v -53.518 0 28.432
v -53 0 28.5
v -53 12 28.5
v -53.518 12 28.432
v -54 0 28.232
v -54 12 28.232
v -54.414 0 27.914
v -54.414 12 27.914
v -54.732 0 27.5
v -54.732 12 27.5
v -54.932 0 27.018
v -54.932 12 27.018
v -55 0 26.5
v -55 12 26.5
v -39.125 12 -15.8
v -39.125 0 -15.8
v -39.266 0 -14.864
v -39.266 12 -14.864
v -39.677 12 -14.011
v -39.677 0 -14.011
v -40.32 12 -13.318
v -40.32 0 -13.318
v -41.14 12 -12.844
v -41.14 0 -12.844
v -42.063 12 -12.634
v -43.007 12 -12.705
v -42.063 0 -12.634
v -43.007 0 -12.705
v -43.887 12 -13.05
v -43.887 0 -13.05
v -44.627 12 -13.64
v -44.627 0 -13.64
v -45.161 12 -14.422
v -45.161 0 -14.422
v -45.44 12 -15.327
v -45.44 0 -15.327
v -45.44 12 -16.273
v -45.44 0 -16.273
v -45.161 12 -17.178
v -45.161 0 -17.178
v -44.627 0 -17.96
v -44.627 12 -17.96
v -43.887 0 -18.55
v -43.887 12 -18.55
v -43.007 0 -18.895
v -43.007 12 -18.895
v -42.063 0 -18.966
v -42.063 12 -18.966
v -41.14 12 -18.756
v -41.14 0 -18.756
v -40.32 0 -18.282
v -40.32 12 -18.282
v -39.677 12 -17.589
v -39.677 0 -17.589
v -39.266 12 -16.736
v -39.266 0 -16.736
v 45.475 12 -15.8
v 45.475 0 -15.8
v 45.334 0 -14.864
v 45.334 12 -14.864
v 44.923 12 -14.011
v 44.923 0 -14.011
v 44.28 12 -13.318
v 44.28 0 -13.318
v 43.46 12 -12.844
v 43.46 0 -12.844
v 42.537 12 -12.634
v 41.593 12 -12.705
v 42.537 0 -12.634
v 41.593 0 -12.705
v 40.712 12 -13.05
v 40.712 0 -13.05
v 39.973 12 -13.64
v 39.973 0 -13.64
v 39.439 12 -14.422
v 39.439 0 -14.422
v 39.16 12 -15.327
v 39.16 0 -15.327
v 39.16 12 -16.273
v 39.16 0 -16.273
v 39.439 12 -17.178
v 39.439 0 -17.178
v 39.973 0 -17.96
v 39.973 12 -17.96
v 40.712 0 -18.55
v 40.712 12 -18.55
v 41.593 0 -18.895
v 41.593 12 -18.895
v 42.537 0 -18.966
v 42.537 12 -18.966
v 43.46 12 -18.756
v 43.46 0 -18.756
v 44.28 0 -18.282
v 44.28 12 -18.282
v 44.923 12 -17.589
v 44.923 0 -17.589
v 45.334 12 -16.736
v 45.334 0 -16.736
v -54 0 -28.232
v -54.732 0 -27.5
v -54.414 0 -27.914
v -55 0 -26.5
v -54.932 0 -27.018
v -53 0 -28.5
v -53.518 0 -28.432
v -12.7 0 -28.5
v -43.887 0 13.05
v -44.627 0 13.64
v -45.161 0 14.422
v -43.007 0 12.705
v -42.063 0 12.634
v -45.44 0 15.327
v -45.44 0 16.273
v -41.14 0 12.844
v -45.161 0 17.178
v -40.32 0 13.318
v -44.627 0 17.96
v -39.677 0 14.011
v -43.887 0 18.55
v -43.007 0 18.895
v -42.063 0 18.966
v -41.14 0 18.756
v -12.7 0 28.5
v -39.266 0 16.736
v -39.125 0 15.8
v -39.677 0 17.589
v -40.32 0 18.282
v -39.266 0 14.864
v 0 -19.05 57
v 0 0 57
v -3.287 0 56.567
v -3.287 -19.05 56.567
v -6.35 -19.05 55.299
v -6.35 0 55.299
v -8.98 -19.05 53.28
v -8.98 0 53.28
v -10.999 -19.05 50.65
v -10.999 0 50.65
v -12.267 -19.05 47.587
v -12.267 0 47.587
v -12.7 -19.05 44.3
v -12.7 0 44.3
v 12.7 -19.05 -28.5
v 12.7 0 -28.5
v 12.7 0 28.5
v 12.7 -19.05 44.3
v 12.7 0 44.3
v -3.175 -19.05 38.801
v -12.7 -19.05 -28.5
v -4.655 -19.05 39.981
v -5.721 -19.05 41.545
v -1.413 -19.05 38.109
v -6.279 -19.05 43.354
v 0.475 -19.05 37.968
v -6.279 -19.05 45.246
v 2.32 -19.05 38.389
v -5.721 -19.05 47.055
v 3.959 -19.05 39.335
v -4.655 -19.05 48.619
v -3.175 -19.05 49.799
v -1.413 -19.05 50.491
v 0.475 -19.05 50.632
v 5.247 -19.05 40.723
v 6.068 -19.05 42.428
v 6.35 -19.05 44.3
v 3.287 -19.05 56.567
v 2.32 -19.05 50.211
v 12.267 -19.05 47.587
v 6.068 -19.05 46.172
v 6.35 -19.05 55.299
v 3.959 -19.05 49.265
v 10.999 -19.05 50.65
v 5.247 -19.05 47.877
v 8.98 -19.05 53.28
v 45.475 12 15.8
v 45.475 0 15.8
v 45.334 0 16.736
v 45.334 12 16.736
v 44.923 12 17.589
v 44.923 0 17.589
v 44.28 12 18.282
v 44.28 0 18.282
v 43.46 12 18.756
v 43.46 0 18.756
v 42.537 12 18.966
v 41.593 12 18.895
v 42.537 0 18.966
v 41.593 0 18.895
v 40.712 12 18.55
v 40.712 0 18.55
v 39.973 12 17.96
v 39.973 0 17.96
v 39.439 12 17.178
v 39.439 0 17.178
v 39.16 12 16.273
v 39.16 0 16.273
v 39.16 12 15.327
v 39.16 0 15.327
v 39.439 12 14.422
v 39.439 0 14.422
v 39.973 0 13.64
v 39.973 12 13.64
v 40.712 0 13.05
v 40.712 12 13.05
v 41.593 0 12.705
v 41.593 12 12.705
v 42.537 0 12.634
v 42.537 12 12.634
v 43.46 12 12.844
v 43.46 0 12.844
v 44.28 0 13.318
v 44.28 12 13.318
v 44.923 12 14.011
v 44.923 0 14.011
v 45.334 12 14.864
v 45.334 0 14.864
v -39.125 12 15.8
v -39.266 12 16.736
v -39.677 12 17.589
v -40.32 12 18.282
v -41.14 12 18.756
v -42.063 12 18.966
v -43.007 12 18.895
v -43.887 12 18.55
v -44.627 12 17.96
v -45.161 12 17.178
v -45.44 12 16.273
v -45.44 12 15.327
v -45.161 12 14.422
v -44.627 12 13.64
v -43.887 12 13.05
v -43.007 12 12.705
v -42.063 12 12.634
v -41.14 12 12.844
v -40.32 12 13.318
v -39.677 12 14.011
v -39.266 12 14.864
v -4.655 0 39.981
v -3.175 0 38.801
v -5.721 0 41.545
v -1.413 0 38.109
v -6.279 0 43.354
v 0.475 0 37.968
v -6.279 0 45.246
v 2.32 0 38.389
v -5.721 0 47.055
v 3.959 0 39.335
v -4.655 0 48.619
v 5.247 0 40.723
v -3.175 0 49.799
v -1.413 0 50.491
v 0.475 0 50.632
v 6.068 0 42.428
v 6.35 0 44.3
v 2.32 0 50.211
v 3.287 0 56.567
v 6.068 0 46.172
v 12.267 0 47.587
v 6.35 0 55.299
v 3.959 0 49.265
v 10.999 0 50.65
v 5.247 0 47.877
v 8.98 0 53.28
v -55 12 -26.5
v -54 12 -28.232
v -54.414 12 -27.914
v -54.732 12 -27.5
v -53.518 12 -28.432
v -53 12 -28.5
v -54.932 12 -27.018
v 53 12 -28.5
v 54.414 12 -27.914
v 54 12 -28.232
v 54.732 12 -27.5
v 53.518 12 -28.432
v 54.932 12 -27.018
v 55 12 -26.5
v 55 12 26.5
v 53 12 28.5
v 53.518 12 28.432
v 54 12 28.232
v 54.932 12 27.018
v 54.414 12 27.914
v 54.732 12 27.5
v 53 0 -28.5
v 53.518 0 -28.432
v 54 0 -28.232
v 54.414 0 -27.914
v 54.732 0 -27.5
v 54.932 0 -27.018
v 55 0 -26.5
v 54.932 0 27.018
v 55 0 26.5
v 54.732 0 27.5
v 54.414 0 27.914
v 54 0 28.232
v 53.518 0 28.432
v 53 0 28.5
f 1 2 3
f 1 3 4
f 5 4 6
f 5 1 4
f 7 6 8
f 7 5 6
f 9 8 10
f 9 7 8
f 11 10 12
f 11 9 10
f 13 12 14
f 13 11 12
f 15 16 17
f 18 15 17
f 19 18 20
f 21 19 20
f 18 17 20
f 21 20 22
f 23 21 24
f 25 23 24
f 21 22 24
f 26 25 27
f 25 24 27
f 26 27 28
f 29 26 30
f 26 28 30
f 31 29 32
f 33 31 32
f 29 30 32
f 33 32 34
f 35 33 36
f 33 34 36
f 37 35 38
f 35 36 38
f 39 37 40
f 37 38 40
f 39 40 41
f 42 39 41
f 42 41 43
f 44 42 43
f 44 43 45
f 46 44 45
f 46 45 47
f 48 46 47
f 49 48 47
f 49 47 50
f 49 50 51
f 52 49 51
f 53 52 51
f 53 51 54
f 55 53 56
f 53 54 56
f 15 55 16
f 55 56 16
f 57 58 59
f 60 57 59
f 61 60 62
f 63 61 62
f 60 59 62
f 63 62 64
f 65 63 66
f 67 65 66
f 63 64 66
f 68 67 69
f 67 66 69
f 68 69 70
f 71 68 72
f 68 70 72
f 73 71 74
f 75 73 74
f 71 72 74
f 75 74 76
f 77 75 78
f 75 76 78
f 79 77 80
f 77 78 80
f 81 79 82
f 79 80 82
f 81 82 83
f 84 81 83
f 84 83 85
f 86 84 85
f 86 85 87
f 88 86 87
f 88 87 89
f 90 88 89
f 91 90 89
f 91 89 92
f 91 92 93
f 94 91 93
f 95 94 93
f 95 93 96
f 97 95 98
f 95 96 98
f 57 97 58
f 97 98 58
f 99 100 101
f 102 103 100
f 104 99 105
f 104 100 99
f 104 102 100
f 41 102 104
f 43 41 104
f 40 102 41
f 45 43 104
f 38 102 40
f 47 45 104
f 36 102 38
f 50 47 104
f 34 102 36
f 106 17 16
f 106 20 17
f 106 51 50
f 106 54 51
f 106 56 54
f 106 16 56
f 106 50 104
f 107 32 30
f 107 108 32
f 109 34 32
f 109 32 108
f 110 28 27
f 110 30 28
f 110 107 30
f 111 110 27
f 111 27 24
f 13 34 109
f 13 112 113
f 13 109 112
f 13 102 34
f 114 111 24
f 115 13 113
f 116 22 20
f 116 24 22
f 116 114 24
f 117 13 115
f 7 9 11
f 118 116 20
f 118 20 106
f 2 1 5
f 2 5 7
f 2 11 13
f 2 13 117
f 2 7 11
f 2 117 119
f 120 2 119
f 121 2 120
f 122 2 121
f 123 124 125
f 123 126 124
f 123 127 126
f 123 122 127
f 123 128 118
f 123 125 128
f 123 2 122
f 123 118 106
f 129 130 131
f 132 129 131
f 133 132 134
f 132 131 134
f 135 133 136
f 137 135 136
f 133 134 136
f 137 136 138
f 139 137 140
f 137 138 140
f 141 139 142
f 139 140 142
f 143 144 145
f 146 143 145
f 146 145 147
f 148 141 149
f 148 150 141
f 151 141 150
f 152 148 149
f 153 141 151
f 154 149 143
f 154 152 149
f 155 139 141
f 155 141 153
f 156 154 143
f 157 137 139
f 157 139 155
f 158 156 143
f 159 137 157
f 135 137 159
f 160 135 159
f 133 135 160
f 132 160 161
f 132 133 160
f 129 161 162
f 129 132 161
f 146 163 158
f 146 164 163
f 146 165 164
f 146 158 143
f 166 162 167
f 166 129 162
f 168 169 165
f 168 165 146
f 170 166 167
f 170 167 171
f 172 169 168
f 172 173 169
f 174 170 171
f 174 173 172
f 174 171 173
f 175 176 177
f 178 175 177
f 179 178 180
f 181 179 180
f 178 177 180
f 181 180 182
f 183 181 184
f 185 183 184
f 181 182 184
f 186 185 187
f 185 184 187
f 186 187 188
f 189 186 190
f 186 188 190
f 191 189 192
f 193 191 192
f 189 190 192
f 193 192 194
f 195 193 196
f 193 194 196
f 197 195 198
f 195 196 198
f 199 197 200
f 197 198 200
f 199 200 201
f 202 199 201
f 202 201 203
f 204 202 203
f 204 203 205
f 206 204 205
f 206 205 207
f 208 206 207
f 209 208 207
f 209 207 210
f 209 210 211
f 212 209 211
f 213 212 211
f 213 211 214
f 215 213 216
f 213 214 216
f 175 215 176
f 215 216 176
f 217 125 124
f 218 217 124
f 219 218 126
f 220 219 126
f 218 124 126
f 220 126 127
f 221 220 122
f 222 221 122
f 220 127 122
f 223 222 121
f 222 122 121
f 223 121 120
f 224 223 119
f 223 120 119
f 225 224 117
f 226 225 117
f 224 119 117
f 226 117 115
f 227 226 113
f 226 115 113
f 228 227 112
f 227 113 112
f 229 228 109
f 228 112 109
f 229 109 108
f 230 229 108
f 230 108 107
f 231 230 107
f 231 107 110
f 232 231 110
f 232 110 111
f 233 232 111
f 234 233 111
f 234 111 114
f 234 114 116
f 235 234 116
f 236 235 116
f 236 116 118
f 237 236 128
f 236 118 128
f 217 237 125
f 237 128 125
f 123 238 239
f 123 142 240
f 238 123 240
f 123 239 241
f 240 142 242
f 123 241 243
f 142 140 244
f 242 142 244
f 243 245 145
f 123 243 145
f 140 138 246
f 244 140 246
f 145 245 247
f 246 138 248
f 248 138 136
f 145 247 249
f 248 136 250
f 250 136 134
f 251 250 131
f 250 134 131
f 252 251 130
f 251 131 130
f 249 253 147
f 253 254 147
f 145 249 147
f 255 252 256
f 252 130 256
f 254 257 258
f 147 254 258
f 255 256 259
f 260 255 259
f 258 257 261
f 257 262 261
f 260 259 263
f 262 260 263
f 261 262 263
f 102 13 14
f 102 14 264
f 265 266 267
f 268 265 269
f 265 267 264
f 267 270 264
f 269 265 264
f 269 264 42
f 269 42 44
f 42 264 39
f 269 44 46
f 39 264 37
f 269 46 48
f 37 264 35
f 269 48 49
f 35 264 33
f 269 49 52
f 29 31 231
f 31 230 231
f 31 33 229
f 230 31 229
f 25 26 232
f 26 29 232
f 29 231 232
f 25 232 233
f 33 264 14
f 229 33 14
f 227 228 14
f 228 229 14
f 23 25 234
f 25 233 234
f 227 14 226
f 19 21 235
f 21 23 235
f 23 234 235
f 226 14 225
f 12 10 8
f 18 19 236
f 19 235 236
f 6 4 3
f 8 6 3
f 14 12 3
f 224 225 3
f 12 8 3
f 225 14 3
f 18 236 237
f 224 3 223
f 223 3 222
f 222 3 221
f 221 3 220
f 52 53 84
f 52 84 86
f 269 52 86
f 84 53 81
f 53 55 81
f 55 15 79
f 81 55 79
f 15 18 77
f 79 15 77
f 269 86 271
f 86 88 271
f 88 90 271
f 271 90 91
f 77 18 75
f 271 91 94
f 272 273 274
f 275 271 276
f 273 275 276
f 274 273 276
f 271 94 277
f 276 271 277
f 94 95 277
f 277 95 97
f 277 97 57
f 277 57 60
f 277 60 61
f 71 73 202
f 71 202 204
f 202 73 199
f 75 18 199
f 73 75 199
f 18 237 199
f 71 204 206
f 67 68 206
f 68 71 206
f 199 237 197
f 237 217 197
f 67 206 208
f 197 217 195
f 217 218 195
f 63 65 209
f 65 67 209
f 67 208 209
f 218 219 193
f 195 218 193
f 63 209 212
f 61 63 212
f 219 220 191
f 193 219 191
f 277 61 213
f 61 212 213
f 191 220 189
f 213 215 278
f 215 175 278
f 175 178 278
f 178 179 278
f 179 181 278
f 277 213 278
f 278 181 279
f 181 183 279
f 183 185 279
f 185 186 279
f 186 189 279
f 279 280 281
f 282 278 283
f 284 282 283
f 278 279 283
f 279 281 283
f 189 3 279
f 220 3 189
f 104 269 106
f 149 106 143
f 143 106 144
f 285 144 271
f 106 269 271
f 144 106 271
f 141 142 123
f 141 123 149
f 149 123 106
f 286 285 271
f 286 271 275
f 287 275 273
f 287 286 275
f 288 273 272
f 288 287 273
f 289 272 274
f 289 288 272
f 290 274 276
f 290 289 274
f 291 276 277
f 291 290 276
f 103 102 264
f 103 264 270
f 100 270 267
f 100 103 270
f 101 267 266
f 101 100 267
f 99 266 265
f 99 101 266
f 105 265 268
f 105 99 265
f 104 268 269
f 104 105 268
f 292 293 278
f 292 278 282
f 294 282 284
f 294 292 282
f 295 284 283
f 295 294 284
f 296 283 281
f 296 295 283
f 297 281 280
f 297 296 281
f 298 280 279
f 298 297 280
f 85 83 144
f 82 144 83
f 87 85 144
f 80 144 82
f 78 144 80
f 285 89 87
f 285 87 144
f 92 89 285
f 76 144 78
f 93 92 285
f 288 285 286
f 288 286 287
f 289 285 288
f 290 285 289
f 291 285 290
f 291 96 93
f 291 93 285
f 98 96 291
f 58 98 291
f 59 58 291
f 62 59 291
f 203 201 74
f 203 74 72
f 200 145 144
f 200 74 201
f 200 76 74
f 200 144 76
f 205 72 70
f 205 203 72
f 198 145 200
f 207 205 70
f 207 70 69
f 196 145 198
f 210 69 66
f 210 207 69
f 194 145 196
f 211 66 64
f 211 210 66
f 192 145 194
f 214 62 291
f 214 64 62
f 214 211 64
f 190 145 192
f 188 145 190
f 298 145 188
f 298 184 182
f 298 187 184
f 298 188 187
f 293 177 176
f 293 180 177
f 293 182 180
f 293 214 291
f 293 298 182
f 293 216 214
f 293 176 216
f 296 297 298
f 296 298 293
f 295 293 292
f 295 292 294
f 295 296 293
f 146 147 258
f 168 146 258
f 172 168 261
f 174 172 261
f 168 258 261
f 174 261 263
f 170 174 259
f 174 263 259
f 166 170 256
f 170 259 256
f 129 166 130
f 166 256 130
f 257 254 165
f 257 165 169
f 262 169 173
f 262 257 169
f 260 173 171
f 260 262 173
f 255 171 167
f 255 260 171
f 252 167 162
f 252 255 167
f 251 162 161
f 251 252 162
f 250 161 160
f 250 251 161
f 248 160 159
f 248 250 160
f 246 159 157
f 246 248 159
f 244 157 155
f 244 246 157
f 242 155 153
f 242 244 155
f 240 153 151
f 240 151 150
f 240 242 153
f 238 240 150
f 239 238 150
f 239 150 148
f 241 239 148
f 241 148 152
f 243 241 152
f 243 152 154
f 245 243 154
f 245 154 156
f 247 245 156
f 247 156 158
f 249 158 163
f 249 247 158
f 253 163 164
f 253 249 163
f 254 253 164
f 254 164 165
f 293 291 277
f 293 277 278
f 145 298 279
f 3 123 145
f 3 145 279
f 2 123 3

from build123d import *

# Parameters (mm, degrees)
F0_W     = 25.4
F0_H     = 57
F0_R     = 3.175
F1_DEPTH = 12
F0_R_2   = 6.35
F2_DEPTH = 19.05


with BuildPart() as f1:
    # F0 (on Front) → F1 (new body)
    with BuildSketch(Plane.XZ):
        Rectangle(F0_W, F0_H)
        with BuildLine():
            Line((-12.7, 28.5), (-53, 28.5))
            ThreePointArc((-53, 28.5), (-54.4142135624, 27.9142135624), (-55, 26.5))
            Line((-55, 26.5), (-55, -26.5))
            ThreePointArc((-55, -26.5), (-54.4142135624, -27.9142135624), (-53, -28.5))
            Line((-53, -28.5), (-12.7, -28.5))
            Line((-12.7, -28.5), (-12.7, 28.5))
        make_face()
        with Locations((-42.3, -15.8)):
            Circle(F0_R, mode=Mode.SUBTRACT)
        with Locations((-42.3, 15.8)):
            Circle(F0_R, mode=Mode.SUBTRACT)
        with BuildLine():
            Line((53, 28.5), (12.7, 28.5))
            Line((12.7, 28.5), (12.7, -28.5))
            Line((12.7, -28.5), (53, -28.5))
            ThreePointArc((53, -28.5), (54.4142135624, -27.9142135624), (55, -26.5))
            Line((55, -26.5), (55, 26.5))
            ThreePointArc((55, 26.5), (54.4142135624, 27.9142135624), (53, 28.5))
        make_face()
        with Locations((42.3, -15.8)):
            Circle(F0_R, mode=Mode.SUBTRACT)
        with Locations((42.3, 15.8)):
            Circle(F0_R, mode=Mode.SUBTRACT)
    extrude(amount=-F1_DEPTH)

    # F0 (on Front) → F2 (join)
    with BuildSketch(Plane.XZ):
        Rectangle(F0_W, F0_H)
        with BuildLine():
            Line((-12.7, 44.3), (-12.7, 28.5))
            Line((-12.7, 28.5), (12.7, 28.5))
            Line((12.7, 28.5), (12.7, 44.3))
            ThreePointArc((12.7, 44.3), (0, 31.6), (-12.7, 44.3))
        make_face()
        with BuildLine():
            ThreePointArc((0, 57), (-8.9802561211, 53.2802561211), (-12.7, 44.3))
            ThreePointArc((-12.7, 44.3), (0, 31.6), (12.7, 44.3))
            ThreePointArc((12.7, 44.3), (8.9802561211, 53.2802561211), (0, 57))
        make_face()
        with Locations((0, 44.3)):
            Circle(F0_R_2, mode=Mode.SUBTRACT)
    extrude(amount=F2_DEPTH)


solid = f1.part
